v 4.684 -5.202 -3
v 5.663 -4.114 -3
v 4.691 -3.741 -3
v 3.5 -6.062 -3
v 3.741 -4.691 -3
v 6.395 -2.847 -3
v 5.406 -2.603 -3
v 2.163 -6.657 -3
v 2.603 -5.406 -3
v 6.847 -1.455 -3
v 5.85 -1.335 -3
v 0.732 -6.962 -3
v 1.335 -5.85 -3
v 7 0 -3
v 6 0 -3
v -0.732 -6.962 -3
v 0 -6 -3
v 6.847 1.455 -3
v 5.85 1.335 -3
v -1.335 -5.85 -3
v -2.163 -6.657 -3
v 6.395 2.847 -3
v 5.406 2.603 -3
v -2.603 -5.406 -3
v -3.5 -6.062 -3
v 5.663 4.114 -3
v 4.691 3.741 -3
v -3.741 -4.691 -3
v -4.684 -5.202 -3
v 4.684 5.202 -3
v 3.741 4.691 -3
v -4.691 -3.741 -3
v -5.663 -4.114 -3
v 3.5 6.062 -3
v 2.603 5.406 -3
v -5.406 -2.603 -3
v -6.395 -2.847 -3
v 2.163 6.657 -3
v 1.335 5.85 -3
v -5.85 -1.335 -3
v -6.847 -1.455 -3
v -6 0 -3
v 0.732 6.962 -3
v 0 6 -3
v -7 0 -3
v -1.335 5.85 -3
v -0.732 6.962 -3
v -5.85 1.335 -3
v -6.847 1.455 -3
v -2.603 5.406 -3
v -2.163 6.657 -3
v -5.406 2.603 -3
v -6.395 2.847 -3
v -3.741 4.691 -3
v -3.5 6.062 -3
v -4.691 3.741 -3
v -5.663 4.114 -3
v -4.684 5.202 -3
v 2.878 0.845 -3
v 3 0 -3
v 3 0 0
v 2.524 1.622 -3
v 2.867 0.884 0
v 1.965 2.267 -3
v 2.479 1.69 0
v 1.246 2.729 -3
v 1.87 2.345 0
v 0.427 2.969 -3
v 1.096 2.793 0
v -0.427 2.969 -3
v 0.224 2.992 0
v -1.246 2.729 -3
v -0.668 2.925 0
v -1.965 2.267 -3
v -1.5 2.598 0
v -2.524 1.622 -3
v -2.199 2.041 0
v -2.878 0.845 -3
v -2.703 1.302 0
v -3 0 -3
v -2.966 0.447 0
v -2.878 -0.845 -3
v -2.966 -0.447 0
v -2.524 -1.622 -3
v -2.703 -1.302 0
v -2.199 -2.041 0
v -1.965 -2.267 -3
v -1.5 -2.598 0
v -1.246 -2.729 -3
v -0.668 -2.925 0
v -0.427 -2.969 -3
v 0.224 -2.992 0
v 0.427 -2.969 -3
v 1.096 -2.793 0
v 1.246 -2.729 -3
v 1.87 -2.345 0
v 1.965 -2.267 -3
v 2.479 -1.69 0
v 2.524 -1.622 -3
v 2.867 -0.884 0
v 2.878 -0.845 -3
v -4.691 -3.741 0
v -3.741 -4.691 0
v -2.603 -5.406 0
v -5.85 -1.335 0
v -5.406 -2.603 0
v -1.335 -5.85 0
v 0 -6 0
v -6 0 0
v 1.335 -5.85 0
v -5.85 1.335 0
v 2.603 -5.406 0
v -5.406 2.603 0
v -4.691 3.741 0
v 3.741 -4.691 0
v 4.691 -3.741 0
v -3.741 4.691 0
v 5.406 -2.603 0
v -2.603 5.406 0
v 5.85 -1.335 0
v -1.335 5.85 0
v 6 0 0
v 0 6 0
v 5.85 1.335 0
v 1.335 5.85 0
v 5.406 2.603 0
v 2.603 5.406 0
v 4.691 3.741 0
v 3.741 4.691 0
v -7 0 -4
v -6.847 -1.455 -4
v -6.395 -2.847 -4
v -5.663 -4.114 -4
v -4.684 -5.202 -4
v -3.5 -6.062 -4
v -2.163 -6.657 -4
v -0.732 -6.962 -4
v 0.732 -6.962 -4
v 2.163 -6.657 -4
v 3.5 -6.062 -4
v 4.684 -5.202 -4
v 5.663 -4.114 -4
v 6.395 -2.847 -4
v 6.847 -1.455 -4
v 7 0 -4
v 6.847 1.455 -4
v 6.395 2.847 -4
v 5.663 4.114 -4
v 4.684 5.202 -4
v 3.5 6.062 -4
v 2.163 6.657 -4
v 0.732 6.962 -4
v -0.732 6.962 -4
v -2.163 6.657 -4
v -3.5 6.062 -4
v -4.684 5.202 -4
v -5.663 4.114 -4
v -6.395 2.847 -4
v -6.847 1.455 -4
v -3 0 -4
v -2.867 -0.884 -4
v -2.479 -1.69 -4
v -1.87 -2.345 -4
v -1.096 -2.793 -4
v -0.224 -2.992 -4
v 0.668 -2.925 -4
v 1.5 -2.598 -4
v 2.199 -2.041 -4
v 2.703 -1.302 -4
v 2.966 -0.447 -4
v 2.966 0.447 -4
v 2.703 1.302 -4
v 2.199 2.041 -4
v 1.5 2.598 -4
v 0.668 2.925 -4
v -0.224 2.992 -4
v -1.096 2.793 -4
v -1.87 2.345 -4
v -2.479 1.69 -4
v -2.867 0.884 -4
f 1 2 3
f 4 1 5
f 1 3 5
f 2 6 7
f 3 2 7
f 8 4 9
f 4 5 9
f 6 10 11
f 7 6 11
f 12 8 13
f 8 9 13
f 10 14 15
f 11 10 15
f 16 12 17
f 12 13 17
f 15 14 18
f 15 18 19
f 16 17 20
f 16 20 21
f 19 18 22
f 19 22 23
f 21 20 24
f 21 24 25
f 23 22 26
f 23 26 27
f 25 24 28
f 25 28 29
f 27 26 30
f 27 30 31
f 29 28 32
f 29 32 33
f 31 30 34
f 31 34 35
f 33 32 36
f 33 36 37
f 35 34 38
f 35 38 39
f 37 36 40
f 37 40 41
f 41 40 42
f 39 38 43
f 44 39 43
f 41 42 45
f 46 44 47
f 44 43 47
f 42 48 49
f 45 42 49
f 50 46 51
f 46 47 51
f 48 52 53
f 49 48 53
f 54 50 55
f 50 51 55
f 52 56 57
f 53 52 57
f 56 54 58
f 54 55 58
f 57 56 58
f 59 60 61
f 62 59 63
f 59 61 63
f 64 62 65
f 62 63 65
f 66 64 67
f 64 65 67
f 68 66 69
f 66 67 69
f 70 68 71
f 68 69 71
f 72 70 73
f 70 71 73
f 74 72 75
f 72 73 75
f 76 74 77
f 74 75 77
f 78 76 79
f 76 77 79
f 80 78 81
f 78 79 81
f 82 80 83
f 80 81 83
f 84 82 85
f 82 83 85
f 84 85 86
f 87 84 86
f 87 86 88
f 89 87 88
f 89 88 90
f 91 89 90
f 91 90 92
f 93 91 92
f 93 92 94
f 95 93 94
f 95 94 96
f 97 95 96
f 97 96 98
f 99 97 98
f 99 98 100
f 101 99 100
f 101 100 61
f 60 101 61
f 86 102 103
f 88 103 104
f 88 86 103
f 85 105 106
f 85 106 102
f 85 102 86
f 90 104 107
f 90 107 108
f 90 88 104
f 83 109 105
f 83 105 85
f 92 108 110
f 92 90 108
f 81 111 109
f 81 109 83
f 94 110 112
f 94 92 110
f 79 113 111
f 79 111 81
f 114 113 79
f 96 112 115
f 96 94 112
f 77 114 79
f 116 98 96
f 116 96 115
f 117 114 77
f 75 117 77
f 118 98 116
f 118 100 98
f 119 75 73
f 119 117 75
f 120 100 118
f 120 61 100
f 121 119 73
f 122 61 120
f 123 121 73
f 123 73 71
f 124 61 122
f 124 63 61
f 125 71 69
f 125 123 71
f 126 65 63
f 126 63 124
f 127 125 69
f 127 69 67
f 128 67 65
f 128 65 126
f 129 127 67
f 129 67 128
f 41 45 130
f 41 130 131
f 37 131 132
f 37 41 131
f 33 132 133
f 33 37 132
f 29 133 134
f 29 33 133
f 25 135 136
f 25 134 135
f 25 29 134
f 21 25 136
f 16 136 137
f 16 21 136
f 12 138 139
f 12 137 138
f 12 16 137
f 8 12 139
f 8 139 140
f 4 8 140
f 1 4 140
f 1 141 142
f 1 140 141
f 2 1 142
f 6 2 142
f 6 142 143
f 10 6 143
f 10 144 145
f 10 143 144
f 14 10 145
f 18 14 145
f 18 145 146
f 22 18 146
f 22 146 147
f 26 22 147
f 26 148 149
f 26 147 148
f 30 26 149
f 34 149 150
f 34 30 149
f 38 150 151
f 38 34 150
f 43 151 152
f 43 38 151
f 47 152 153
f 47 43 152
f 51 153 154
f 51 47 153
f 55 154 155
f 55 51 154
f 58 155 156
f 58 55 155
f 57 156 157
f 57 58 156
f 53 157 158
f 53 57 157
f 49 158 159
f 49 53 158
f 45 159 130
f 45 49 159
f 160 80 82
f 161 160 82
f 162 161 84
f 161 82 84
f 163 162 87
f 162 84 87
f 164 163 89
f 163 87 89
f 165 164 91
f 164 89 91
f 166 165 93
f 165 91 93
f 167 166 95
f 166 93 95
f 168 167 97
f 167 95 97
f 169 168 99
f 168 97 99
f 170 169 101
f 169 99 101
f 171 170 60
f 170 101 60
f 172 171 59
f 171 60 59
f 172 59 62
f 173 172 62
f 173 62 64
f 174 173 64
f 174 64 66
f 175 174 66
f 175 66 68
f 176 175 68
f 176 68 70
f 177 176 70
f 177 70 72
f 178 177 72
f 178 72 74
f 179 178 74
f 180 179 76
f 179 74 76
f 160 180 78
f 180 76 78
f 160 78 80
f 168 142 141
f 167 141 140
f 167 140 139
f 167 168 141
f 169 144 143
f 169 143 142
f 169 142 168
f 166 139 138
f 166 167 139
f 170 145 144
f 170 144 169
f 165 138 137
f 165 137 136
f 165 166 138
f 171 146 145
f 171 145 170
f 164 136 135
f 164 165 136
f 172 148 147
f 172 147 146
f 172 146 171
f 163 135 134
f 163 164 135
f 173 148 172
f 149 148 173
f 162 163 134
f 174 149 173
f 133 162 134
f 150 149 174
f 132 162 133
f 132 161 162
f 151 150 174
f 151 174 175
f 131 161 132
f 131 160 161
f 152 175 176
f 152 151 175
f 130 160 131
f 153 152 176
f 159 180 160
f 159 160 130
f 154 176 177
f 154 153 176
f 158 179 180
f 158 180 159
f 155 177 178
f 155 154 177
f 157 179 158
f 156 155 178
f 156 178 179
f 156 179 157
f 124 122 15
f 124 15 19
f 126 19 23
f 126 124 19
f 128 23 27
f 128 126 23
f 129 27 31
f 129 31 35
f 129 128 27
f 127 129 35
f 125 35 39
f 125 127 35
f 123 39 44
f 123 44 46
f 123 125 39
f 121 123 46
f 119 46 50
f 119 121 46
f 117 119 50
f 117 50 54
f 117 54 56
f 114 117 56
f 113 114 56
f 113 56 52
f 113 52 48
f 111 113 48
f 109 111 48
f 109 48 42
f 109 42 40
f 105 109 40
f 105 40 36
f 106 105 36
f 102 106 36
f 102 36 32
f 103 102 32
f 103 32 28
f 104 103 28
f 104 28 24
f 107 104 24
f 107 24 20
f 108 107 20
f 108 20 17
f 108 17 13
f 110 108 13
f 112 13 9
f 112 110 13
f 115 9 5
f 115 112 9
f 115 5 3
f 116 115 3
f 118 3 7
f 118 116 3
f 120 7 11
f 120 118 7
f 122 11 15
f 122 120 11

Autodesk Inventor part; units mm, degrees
ref_plane "YZ Plane" through (0, 0, 0) normal (1, 0, 0) x (0, 1, 0)
ref_plane "XZ Plane" through (0, 0, 0) normal (0, 1, 0) x (-1, 0, 0)
ref_plane "XY Plane" through (0, 0, 0) normal (0, 0, 1) x (1, 0, 0)
sketch "Sketch1" plane through (0, 0, 0) normal (0, 0, 1) x (1, 0, 0)
  circle A0 centre (0, 0) radius 3
  circle A1 centre (0, 0) radius 6
  dimension "d0" = 6
  dimension "d1" = 12
extrude "Extrusion1" add sketch "Sketch1" against normal blind 3
sketch "Sketch2" plane through (0, 0, -3) normal (0, 0, -1) x (-1, 0, 0)
  circle A0 centre (0, 0) radius 7
  circle A1 centre (0, 0) radius 3 projected
  dimension "d4" = 14
extrude "Extrusion2" add sketch "Sketch2" along normal blind 1
properties part number "Φ6-12a" material "Steel AISI 1006 85 HR"
